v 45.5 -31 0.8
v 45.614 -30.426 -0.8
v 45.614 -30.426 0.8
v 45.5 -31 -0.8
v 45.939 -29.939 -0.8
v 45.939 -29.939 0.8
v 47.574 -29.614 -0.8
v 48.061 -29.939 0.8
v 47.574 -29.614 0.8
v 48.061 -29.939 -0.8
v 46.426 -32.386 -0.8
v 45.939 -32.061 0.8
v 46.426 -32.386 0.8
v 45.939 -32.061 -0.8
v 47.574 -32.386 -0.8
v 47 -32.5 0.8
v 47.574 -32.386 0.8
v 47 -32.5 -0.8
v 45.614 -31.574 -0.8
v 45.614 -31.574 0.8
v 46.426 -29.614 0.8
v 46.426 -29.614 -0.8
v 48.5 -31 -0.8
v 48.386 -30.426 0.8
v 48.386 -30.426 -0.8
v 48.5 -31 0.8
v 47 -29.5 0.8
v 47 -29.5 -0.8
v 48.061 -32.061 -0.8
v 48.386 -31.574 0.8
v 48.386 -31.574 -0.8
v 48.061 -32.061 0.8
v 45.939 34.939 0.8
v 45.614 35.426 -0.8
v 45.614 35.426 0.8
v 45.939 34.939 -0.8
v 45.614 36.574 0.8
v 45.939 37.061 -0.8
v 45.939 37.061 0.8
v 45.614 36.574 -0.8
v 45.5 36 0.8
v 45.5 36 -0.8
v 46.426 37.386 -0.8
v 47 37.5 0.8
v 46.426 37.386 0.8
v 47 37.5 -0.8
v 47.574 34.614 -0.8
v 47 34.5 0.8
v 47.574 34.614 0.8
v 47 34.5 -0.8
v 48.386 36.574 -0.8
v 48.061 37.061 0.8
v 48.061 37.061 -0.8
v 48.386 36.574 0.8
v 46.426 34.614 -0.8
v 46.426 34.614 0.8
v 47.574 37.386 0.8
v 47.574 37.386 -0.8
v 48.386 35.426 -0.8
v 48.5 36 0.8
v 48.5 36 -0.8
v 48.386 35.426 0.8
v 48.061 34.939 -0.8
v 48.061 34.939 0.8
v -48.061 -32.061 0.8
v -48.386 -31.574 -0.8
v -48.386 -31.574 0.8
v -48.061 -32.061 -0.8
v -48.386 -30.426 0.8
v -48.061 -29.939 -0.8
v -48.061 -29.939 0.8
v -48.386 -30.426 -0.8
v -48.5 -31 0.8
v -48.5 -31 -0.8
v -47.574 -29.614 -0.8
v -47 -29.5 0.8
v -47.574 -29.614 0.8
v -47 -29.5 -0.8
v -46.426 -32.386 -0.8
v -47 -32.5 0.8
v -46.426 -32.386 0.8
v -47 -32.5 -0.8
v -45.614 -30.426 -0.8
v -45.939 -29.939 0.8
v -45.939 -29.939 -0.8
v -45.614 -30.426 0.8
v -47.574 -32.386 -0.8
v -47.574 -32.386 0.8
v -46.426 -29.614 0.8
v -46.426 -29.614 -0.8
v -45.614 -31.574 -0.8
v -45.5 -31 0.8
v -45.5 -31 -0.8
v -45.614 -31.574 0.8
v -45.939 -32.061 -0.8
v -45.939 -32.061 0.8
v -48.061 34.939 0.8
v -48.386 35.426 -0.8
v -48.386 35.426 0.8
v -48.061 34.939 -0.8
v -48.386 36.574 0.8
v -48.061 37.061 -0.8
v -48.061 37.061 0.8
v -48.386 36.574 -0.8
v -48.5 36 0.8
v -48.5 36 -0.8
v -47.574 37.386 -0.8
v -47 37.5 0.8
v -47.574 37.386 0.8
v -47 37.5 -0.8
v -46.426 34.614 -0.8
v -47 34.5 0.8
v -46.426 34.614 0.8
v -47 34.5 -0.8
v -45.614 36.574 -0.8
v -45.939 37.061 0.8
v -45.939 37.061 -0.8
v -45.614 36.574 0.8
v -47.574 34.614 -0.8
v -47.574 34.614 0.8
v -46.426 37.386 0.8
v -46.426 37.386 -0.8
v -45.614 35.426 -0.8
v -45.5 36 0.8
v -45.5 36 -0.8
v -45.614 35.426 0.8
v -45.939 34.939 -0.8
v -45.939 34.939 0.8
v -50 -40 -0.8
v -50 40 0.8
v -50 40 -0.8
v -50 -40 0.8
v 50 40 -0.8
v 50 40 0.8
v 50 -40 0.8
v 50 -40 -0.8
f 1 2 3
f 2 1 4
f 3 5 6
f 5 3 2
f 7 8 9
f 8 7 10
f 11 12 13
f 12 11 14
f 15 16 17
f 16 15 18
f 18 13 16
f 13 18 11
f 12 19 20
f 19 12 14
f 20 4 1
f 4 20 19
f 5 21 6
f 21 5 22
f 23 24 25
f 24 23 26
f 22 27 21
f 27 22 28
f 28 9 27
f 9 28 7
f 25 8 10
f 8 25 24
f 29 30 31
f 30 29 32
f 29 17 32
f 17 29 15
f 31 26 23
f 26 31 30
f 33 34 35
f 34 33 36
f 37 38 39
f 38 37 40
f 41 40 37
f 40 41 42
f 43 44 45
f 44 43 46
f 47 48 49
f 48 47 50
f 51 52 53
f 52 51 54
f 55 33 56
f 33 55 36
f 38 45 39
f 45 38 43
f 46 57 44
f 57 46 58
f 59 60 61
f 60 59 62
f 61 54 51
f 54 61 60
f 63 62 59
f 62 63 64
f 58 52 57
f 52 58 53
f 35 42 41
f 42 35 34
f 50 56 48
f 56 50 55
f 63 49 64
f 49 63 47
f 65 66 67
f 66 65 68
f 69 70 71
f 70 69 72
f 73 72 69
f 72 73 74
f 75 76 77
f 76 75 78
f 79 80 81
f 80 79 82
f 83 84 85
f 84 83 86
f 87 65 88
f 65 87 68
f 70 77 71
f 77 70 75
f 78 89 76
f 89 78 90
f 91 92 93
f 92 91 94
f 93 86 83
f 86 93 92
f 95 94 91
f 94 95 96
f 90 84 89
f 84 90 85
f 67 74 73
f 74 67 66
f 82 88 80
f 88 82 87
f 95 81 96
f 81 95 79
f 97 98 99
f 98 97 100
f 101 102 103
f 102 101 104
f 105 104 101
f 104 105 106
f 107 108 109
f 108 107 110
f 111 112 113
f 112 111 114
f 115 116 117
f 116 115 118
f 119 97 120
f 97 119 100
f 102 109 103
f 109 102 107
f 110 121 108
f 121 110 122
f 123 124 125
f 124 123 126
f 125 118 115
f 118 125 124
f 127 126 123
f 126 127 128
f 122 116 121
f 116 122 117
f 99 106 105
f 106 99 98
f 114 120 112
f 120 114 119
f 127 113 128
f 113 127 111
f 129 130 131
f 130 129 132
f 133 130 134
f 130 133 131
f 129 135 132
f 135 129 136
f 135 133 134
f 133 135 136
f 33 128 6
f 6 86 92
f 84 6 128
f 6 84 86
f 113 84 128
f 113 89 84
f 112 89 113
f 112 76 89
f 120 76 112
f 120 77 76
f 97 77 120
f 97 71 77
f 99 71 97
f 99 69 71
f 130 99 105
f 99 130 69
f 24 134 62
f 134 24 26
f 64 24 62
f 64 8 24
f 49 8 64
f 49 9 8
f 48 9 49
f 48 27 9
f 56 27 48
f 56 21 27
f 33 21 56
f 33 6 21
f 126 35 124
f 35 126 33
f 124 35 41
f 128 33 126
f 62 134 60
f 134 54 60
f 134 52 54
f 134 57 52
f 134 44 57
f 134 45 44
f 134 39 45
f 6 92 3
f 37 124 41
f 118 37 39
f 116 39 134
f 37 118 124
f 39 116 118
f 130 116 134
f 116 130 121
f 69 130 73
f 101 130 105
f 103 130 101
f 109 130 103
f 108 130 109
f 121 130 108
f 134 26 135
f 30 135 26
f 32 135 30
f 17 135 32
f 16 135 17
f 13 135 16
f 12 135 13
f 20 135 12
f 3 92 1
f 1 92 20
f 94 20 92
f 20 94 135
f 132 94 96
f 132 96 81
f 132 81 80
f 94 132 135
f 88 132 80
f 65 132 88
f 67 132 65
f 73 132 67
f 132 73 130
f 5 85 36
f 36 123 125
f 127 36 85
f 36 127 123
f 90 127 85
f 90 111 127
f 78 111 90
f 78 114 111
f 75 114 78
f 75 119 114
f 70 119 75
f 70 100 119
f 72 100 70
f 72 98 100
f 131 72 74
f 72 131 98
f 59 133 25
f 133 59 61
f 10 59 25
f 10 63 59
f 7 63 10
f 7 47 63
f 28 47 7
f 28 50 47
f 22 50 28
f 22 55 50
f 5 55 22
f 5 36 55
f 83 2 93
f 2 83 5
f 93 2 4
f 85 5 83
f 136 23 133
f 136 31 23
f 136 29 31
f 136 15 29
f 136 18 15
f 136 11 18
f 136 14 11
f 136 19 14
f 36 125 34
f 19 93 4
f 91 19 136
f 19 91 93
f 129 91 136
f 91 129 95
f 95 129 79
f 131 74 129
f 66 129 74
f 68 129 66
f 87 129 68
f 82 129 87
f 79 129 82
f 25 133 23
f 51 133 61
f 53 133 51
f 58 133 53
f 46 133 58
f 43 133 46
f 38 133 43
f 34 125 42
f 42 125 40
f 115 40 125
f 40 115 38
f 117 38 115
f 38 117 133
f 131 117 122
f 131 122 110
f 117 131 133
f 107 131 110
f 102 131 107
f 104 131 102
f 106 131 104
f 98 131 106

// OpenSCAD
// file: ../library/linurs/linurs_screw_dim.scad
// Metric screws and nuts 
// urs@linurs.org 2015

// contains dimensions of linurs_screw and can be included in other 
// OpenScad files 


// Consistent parameters in this file
// d screw diameter M2_5, M3, ... (enumeration with screw_d)
// t millimeters added to diameters 
//   For the screw, head, nut = 0. 
//   For the piece where the screw, nut, ... passes through = 0.5 so it slides in well

// enumerations of metric threads
M2_5=0;
M3=1;
M4=2;
M5=3;

// enumerations screw head type
head_cyl=0; // cylinder
head_cnt=1; // countrsunk
head_no=2;  // no head at all
head_hex=3;  // no head at all

// screw diameters
screw_d=[
2.5, // M2.5
3.0, // M3
4.0, // M4
5.0  // M5
];

// sizes for hex nuts
screw_hex=[
//   s,   e,   h
 [ 5.0, 5.8, 1.7], // M2.5
 [ 5.5, 6.4, 2.0], // M3
 [ 7.0, 8.1, 2.8], // M4
 [ 8.0, 9.2, 3.5]  // M5
];

// sizes for cylinder screw heads
screw_cyl=[
//   d,   h
 [ 4.5, 1.6], // M2.5
 [ 5.5, 2.0], // M3
 [ 7.0, 2.6], // M4
 [ 8.5, 3.3]  // M5
];

// sizes for countersunk screw heads
screw_cnt=[
//   d,   h
 [ 4.7, 1.50], // M2.5
 [ 5.6, 1.65], // M3
 [ 7.4, 2.20], // M4
 [ 9.2, 2.50]  // M5
];
// file: ../library/din41612/connector_dim.scad
// connector
// Connector to be mounted on pcb of the modules

pcb_thick=1.6;

con_w=87.5;   // width of connector bodywithout flanges of mounting holes 
con_d=2.8;    // diameter of mounting holes
con_d_w=88.9; // distance between mounting holes
con_m_h=6;    // height of mounting cube
con_h=13;     // largest z dimension

pcb_d_h=10.2;  // ???

// connector dimensions
motherboard_con_head_w=85;  // width of the connector head
motherboard_con_head_d=8.5; // depth of the connector head
motherboard_con_w=95;       // largest width of the connector
motherboard_con_h=11.6;     // largest height of the connector
motherboard_con_t=11;       // largest depth of the connector
motherboard_con_d_w=90;     // distance between mounting holes
motherboard_con_d=2.8;      // diameter of mounting holes
motherboard_con_out=5.2;    // height produced by the connector when pulgged in 

// pcb module connector dimension
pcbmodule_con_out=13-(5.3+2.8-2.54);  // distance connector sticks out of pcb

// for codings
//code=2157;
//code_n=14;
//code_l=motherboard_con_head_w/code_n/2;
//
//label_width=24;
//label_thick=0.5;
//label_size=6;
//label_text_thick=1;
//label_height=label_size+2;
//pass=0.5;
// file: pcbmodule_dim.scad
include <../library/linurs/linurs_screw_dim.scad>
include <../motherboard/motherboard_dim.scad>
// pcb constants
pcb_h=80;              // height of the pcb
pcb_thick=1.6;         // thickness
pcb_x1=3;              // position mounting holes
pcb_x2=97;
pcb_y1=9;
pcb_y2=76;
pcb_d=3;               // diameter of holes

// bracket constants
bracket_t=2;           // thickness of bracket
bracket_x1=10;         // depth of the U shape at the side of the screw
bracket_x2=4;          // depth of the U shape at the side where no screw is  
bracket_h=pcb_h+15;    // height of bracket
bracket_hole_cube_h=4; // height of the mounting hole cube
bracket_screw=M2_5;    // hole for the screw

// bracket offsets
bracket_offset_x=-3;   // bracket offset in elecbox x axis (adding gap)
bracket_offset_z=-10;  // bracket offset in elecbox z axis

// pcb module dimensions
pcbmodule_w=(-bracket_offset_x)*2+motherboard_w; // depth of the module
pcbmodule_h=bracket_h;                           // hight of the module   
pcbmodule_l=step;                                // width of the module   

screw_t=1; //mm added so screws fit into holes
olp=0.1; // overlapp distance to produce nice body after difference() 
// file: ../motherboard/motherboard_dim.scad
include<../library/din41612/connector_dim.scad>
// motherboard pcb dimensions
motherboard_w=100;   // pcb width
motherboard_t=1.6;   // pcb thickness
motherboard_pass=0.5;// gap to fit screws 
step=25.4;           // distance between modules



// offset
motherboard_z_offset= -(pcbmodule_con_out+motherboard_con_out+motherboard_t); // z offset motherboard built in
// main file
// pcb
// pcb of the module
// This module is not intended to be 3D printed

include <../motherboard/motherboard_dim.scad>
include <pcbmodule_dim.scad>


module pcb(){
  echo("pcb");  
  color("greenyellow")
  difference(){
    cube([motherboard_w,pcb_thick,pcb_h]); // pcb
    for(x=[pcb_x1,pcb_x2]){ // mounting holes
      for(y=[pcb_y1,pcb_y2]){
        translate([x,0,y])
        rotate([90,0,0])
        cylinder(d=pcb_d,h=3*pcb_thick,center=true,$fn=16);
      }
    }
  }
}

// move to center to create 2D drawings with script
rotate([90,0,180])
translate([-50,-0.8,-40])
pcb();
